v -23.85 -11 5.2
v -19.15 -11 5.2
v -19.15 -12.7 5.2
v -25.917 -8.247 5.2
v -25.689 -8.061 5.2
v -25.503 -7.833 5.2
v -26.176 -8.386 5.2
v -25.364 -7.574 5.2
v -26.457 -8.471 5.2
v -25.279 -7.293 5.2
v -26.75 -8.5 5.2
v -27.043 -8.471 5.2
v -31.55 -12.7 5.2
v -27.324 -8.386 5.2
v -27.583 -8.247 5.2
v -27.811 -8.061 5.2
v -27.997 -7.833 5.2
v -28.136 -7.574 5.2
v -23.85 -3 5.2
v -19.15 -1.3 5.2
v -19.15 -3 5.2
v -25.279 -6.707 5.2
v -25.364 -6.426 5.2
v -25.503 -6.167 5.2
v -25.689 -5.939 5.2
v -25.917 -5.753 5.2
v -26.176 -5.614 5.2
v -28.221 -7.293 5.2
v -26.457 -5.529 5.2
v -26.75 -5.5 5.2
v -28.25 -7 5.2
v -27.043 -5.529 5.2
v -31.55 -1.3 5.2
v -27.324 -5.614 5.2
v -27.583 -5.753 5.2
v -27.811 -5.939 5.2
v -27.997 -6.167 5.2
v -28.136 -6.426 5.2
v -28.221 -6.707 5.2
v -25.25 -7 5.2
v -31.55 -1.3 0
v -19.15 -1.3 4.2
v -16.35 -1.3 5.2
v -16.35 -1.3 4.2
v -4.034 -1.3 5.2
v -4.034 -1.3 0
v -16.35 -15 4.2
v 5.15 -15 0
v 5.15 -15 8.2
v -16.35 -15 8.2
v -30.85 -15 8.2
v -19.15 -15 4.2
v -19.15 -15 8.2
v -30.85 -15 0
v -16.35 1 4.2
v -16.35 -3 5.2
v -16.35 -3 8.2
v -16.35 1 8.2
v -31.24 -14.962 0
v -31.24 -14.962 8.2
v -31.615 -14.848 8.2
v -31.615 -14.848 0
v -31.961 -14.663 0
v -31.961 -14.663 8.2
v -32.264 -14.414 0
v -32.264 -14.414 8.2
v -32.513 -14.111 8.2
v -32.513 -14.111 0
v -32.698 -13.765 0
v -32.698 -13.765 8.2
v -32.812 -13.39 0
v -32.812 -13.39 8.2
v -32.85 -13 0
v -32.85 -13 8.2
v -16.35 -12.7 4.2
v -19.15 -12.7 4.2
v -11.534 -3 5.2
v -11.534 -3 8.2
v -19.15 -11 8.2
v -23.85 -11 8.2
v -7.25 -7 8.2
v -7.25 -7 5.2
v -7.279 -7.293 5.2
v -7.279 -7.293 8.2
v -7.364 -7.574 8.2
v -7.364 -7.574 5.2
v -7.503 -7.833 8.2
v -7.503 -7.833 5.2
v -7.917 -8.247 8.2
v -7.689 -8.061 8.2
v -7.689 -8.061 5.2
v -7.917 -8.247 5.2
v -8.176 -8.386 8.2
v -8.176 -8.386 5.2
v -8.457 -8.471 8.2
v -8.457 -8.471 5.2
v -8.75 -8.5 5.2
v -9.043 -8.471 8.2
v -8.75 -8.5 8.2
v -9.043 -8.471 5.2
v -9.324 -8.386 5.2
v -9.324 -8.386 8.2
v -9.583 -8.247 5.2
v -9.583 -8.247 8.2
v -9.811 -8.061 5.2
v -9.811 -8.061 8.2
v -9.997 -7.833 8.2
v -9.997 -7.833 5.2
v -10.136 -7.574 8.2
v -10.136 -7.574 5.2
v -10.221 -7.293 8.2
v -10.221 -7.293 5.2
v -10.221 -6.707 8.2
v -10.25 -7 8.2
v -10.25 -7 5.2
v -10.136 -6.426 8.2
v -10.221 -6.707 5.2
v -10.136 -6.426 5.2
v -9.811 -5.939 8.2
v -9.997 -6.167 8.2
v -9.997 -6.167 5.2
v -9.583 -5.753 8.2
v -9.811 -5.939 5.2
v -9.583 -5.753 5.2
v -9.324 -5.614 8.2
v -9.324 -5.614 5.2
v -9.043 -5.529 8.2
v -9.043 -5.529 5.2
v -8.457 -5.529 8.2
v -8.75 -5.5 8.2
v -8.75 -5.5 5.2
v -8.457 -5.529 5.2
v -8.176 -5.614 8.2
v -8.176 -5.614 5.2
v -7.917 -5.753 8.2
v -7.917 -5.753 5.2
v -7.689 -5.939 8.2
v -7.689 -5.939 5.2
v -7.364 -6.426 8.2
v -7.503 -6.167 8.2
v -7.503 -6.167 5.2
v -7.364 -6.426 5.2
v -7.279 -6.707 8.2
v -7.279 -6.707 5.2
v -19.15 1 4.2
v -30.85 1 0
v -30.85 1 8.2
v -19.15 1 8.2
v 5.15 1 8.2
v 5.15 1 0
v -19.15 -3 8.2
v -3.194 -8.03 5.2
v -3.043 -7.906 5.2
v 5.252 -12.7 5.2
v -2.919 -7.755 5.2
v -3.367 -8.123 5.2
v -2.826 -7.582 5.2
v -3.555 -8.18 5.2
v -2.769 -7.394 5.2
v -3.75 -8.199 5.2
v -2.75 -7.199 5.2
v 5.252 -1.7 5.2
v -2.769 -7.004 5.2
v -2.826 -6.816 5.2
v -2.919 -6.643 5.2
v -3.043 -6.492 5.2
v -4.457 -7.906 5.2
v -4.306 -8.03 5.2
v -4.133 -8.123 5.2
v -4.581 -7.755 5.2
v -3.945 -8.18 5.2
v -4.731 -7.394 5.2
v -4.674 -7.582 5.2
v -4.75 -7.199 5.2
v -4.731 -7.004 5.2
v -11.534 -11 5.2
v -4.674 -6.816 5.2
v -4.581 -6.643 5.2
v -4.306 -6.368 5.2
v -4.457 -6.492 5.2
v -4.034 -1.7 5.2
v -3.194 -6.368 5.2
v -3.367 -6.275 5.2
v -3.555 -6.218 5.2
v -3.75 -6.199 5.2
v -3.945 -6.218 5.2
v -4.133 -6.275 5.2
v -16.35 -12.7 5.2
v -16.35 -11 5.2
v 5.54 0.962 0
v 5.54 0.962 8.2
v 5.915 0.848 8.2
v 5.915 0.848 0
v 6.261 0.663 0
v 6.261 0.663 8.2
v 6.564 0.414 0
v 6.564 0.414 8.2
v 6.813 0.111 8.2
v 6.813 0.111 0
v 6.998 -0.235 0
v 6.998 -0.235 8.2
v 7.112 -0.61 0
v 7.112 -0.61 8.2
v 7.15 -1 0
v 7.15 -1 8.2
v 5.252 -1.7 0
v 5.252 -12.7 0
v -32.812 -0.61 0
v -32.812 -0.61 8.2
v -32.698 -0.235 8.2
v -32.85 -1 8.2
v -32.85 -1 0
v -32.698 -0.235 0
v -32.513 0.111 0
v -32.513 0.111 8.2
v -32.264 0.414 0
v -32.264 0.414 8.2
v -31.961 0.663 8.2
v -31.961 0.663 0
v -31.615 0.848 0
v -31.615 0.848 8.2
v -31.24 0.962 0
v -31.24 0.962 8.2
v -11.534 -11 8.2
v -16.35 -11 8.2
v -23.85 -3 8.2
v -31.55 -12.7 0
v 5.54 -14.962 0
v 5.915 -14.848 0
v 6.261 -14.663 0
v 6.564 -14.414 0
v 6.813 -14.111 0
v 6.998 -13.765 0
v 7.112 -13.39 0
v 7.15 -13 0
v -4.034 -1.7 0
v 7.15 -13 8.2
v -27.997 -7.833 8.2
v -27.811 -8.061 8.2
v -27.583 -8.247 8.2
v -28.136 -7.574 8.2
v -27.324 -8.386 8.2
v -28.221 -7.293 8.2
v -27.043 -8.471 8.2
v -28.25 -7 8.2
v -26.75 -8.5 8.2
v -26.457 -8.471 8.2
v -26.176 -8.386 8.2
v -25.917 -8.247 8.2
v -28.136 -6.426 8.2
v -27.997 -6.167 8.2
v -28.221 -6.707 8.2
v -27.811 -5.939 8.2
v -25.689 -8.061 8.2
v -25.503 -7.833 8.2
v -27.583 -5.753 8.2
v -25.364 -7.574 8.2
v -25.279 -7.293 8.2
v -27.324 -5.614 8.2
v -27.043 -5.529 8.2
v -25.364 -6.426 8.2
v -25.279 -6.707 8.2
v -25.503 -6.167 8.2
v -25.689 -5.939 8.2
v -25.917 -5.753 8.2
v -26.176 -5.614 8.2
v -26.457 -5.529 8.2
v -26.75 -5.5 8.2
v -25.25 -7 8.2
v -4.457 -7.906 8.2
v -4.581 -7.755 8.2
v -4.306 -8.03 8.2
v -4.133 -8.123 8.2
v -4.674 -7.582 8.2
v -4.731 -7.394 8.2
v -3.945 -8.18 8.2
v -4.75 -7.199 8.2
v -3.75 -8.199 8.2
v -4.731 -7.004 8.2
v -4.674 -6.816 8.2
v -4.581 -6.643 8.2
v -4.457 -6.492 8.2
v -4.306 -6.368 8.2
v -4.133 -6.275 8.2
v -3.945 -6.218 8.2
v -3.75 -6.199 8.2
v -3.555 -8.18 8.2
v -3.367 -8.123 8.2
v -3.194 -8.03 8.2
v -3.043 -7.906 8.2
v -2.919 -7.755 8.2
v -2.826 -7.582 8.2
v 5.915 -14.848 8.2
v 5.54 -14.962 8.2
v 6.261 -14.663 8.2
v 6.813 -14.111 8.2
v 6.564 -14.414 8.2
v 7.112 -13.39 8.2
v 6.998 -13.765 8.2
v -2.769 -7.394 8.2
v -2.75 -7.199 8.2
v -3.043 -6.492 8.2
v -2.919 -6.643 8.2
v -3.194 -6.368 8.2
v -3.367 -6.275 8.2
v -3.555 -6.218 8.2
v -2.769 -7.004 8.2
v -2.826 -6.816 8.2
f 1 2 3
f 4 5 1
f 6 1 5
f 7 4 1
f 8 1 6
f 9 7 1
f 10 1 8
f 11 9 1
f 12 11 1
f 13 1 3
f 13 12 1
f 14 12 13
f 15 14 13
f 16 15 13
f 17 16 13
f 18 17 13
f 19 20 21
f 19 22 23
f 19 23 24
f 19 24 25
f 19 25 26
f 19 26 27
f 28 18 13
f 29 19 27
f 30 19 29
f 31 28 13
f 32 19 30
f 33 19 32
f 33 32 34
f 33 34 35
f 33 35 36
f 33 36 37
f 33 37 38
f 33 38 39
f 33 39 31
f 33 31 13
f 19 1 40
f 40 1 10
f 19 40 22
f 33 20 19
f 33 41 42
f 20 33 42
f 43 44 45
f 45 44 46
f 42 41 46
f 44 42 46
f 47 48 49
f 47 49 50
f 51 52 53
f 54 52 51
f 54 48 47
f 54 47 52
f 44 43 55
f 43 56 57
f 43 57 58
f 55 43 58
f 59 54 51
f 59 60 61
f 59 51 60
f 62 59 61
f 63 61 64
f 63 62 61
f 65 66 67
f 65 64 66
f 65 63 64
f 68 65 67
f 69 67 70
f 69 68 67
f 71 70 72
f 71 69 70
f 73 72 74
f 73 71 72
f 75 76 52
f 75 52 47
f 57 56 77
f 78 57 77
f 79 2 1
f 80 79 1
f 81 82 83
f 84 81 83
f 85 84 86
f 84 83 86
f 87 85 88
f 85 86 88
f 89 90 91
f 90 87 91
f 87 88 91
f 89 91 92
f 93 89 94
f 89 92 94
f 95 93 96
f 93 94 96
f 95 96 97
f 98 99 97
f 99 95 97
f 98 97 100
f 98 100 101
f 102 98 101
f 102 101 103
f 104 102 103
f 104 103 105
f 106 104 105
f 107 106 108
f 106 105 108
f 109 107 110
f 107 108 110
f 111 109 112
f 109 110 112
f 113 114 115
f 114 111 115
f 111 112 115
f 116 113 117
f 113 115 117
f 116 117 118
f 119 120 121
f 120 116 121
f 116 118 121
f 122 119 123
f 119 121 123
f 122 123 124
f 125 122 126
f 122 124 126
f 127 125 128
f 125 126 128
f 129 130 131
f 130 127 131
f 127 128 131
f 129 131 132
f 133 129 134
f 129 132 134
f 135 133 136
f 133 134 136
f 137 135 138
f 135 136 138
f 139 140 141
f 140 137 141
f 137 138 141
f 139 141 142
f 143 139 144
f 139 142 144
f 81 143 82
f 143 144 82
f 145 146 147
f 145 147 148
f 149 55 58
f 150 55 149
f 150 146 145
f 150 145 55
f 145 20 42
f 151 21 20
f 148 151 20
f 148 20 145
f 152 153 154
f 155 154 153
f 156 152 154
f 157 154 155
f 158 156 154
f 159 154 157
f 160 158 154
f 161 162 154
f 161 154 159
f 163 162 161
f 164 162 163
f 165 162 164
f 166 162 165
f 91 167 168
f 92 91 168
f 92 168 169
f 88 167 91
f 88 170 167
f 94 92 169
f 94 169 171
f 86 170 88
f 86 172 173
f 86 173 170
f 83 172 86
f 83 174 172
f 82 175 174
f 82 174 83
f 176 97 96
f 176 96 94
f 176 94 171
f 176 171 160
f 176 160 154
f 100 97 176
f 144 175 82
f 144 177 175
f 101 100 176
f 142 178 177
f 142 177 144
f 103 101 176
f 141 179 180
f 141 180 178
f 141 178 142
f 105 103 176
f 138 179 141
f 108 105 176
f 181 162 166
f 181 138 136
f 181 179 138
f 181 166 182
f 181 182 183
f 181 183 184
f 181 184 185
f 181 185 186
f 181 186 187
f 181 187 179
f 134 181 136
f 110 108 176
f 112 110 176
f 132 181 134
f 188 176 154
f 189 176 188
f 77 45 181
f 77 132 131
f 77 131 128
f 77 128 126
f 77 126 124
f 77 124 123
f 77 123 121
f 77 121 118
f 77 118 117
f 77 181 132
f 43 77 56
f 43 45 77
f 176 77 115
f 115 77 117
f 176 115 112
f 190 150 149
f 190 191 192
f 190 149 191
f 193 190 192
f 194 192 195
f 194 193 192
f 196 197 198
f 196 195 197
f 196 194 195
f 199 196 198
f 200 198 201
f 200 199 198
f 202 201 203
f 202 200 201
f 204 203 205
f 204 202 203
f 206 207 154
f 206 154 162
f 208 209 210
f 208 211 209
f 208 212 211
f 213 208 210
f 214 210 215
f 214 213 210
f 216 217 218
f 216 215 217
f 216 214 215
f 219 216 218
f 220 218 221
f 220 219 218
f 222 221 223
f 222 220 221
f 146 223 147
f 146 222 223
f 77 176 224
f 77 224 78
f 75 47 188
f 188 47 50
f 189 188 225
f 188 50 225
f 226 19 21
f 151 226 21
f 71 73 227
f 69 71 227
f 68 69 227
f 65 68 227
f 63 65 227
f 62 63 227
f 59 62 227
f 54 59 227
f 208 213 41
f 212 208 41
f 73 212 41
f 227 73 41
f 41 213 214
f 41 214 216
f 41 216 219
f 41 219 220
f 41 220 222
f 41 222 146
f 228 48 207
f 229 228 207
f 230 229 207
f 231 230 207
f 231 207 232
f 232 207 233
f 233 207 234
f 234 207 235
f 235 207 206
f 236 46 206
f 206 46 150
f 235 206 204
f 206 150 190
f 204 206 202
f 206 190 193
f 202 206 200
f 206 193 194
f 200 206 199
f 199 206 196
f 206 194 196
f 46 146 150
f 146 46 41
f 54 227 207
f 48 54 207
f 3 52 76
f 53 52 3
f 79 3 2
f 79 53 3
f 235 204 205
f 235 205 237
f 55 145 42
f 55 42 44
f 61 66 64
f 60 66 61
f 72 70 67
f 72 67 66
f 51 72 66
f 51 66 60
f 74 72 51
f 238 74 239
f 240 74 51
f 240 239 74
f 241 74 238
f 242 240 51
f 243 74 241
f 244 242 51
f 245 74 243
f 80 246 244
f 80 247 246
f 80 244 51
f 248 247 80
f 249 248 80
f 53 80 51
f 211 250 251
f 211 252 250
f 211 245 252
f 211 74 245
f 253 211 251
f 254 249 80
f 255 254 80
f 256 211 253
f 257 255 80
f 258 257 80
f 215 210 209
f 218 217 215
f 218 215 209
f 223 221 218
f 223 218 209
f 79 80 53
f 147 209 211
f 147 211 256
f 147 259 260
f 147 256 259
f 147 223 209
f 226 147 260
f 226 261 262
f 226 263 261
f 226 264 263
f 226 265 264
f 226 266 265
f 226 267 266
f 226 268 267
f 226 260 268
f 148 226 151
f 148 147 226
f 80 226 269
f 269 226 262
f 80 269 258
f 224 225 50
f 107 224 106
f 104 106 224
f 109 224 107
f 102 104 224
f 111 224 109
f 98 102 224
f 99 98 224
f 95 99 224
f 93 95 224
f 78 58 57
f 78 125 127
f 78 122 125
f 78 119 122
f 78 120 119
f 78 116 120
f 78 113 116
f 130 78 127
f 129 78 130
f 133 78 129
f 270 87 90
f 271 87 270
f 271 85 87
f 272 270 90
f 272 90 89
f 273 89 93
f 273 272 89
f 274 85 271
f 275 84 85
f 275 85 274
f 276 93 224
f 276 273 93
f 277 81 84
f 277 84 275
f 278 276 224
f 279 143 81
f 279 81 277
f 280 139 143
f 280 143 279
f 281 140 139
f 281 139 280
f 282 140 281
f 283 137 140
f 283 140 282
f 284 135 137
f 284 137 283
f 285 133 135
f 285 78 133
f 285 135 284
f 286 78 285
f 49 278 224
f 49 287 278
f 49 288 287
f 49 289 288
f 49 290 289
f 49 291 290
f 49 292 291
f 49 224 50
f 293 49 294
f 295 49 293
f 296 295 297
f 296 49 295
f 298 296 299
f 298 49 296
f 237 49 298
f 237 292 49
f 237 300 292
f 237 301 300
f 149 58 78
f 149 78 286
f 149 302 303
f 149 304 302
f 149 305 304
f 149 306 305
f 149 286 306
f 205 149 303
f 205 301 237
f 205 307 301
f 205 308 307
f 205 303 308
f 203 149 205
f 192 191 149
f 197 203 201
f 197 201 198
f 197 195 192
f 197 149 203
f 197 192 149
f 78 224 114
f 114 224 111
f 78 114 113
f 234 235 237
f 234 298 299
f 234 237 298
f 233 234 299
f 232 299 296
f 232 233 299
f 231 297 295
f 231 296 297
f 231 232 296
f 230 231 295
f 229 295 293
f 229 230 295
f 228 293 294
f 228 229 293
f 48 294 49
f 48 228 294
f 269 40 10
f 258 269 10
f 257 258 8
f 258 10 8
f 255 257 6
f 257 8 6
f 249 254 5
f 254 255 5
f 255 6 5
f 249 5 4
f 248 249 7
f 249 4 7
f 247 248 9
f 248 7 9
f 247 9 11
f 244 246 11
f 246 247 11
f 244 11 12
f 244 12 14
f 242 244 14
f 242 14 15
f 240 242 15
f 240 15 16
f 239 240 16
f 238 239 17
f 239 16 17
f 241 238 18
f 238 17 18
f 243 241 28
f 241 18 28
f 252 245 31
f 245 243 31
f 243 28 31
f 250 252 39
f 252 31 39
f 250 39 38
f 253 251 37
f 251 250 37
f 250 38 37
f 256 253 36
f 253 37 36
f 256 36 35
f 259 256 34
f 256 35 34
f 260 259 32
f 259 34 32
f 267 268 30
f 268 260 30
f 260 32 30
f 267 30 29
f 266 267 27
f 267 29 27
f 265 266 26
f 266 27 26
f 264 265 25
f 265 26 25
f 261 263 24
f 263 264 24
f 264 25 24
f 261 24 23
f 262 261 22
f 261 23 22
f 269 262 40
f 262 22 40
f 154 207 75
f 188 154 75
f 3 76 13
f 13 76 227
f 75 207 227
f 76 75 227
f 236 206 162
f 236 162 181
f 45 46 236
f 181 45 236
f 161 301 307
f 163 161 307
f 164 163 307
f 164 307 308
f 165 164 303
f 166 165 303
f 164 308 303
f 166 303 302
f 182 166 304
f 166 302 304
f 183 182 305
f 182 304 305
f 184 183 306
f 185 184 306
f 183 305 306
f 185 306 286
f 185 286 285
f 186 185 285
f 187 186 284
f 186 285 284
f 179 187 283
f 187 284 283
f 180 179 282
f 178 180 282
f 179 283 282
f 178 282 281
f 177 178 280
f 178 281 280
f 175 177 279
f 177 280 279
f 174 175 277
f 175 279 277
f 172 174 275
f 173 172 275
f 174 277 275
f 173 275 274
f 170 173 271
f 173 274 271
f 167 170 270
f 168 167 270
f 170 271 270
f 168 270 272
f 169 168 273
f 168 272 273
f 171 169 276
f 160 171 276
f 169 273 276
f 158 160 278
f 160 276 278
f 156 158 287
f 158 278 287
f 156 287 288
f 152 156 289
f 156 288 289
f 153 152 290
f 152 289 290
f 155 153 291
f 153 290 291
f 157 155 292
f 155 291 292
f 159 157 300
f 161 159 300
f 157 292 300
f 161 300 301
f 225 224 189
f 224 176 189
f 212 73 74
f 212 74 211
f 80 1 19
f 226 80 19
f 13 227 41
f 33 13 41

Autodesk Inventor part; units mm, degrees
ref_plane "YZ Plane" through (0, 0, 0) normal (1, 0, 0) x (0, 1, 0)
ref_plane "XZ Plane" through (0, 0, 0) normal (0, 1, 0) x (-1, 0, 0)
ref_plane "Work Plane1" through (0, 0, 0) normal (0, 0, 1) x (1, 0, 0)
sketch "Sketch1" plane through (0, 0, 0) normal (0, 0, 1) x (1, 0, 0)
  circle A0 centre (-17.75, 4.5) radius 1.5 projected
  arc A1 (-25.75, 8) -> (-27.75, 6) centre (-25.75, 6) ccw projected
  line L0 (-27.75, 3) -> (-27.75, 6) projected
  line L1 (-30.85, 1) -> (-29.75, 1)
  arc A2 (-30.85, 1) -> (-32.85, -1) centre (-30.85, -1) ccw projected
  line L2 (-32.85, -13) -> (-32.85, -1) projected
  arc A3 (-32.85, -13) -> (-30.85, -15) centre (-30.85, -13) ccw projected
  line L3 (5.15, -15) -> (-30.85, -15) projected
  arc A4 (5.15, -15) -> (7.15, -13) centre (5.15, -13) ccw projected
  line L4 (7.15, -1) -> (7.15, -13) projected
  arc A5 (7.15, -1) -> (5.15, 1) centre (5.15, -1) ccw projected
  line L5 (-30.85, 1) -> (5.15, 1)
  line L6 (-7.75, 3) -> (-7.75, 6) projected
  arc A6 (-7.75, 6) -> (-9.75, 8) centre (-9.75, 6) ccw projected
  line L7 (-25.75, 8) -> (-9.75, 8) projected
  circle A7 centre (-8.75, -7) radius 1.5 projected
  circle A8 centre (-26.75, -7) radius 1.5 projected
  line L8 (-30.85, -12) -> (-5.5342, -12)
  line L9 (-30.85, -2) -> (-30.85, -12)
  line L10 (-5.5342, -2) -> (-5.5342, -12)
  line L11 (-5.5342, -2) -> (-30.85, -2)
  line L12 (-11.5342, -2) -> (-11.5342, -12)
  line L13 (-23.85, -2) -> (-23.85, -12)
  point P0 (0, 0)
  dimension "d2" = 6
  dimension "d3" = 12.6842
  dimension "d4" = 2
  dimension "d5" = 7
extrude "Extrusion4" add sketch "Sketch1" along normal blind 5.2 contours L1 L5 A5 L4 A4 L3 A3 L2 A2
sketch "Sketch5" plane through (0, 0, 5.2) normal (0, 0, 1) x (1, 0, 0)
  line L0 (-30.85, -3) -> (-23.85, -3)
  line L1 (-5.5342, -3) -> (-5.5342, -11)
  line L2 (-5.5342, -11) -> (-11.5342, -11)
  line L3 (-30.85, -11) -> (-30.85, -3)
  arc A0 (-30.85, 1) -> (-32.85, -1) centre (-30.85, -1) ccw projected
  line L4 (-32.85, -1) -> (-32.85, -13) projected
  arc A1 (-32.85, -13) -> (-30.85, -15) centre (-30.85, -13) ccw projected
  line L5 (-30.85, -15) -> (5.15, -15) projected
  arc A2 (5.15, -15) -> (7.15, -13) centre (5.15, -13) ccw projected
  line L6 (7.15, -13) -> (7.15, -1) projected
  arc A3 (7.15, -1) -> (5.15, 1) centre (5.15, -1) ccw projected
  line L7 (5.15, 1) -> (-30.85, 1) projected
  line L8 (-11.5342, -15) -> (-11.5342, 1)
  line L9 (-23.85, -15) -> (-23.85, 1)
  circle A4 centre (-8.75, -7) radius 1.5 projected
  circle A5 centre (-26.75, -7) radius 1.5 projected
  line L10 (-11.5342, -3) -> (-5.5342, -3)
  line L11 (-23.85, -3) -> (-11.5342, -3)
  line L12 (-11.5342, -11) -> (-23.85, -11)
  line L13 (-23.85, -11) -> (-30.85, -11)
  point P0 (0, 0)
  point P1 (-11.5342, -14)
  point P2 (-11.5342, 2)
  point P3 (-23.85, -14)
  point P4 (-23.85, 2)
  dimension "d16" = 6
  dimension "d17" = 7
  dimension "d22" = 4
  dimension "d23" = 4
extrude "Extrusion5" add sketch "Sketch5" along normal blind 3 contours L3 L13 L9 L5 A1 L4 A0 L7 L0 | L0 L9 L13 L3 | L9 L7 L8 L11 | L12 L8 L5 L9 | L10 L1 L2 L8 | L8 L7 A3 L6 A2 L5 L2 L1 L10
sketch "Sketch6" plane through (0, 0, 8.2) normal (0, 0, 1) x (1, 0, 0)
  line L0 (-16.35, -15) -> (-16.35, 1)
  line L1 (-19.15, -15) -> (-19.15, 1)
  line L2 (5.15, 1) -> (-30.85, 1)
  line L3 (-30.85, -15) -> (5.15, -15)
  point P0 (0, 0)
extrude "Extrusion6" cut sketch "Sketch6" against normal blind 4
sketch "Sketch7" plane through (0, 0, 0) normal (0, 0, -1) x (-1, 0, 0)
  line L0 (5.5342, -2) -> (30.85, -2) projected
  line L1 (30.85, -2) -> (30.85, -12) projected
  line L2 (30.85, -12) -> (5.5342, -12) projected
  line L3 (5.5342, -12) -> (5.5342, -2) projected
  line L4 (4.0342, -12.7) -> (31.55, -12.7)
  line L5 (31.55, -12.7) -> (31.55, -1.3)
  line L6 (31.55, -1.3) -> (4.0342, -1.3)
  line L7 (4.0342, -1.3) -> (4.0342, -12.7)
  line L8 (4.0342, -12.7) -> (-5.2525, -12.7)
  line L9 (-5.2525, -12.7) -> (-5.2525, -1.7)
  line L10 (-5.2525, -1.7) -> (4.0342, -1.7)
  line L11 (4.0342, -1.7) -> (4.0342, -12.7)
  point P0 (0, 0)
  dimension "d24" = 0.7
  dimension "d31" = 1.5
extrude "Extrusion7" cut sketch "Sketch7" against normal blind 5.2
sketch "Sketch8" plane through (0, 0, 8.2) normal (0, 0, 1) x (1, 0, 0)
  circle A0 centre (-3.75, -7.199) radius 1
  circle A1 centre (-8.75, -7) radius 1.5 projected
  point P0 (0, 0)
  dimension "d27" = 2
  dimension "d28" = 5
extrude "Extrusion8" cut sketch "Sketch8" against normal through all contours A0
properties part number "optical endstop top"
